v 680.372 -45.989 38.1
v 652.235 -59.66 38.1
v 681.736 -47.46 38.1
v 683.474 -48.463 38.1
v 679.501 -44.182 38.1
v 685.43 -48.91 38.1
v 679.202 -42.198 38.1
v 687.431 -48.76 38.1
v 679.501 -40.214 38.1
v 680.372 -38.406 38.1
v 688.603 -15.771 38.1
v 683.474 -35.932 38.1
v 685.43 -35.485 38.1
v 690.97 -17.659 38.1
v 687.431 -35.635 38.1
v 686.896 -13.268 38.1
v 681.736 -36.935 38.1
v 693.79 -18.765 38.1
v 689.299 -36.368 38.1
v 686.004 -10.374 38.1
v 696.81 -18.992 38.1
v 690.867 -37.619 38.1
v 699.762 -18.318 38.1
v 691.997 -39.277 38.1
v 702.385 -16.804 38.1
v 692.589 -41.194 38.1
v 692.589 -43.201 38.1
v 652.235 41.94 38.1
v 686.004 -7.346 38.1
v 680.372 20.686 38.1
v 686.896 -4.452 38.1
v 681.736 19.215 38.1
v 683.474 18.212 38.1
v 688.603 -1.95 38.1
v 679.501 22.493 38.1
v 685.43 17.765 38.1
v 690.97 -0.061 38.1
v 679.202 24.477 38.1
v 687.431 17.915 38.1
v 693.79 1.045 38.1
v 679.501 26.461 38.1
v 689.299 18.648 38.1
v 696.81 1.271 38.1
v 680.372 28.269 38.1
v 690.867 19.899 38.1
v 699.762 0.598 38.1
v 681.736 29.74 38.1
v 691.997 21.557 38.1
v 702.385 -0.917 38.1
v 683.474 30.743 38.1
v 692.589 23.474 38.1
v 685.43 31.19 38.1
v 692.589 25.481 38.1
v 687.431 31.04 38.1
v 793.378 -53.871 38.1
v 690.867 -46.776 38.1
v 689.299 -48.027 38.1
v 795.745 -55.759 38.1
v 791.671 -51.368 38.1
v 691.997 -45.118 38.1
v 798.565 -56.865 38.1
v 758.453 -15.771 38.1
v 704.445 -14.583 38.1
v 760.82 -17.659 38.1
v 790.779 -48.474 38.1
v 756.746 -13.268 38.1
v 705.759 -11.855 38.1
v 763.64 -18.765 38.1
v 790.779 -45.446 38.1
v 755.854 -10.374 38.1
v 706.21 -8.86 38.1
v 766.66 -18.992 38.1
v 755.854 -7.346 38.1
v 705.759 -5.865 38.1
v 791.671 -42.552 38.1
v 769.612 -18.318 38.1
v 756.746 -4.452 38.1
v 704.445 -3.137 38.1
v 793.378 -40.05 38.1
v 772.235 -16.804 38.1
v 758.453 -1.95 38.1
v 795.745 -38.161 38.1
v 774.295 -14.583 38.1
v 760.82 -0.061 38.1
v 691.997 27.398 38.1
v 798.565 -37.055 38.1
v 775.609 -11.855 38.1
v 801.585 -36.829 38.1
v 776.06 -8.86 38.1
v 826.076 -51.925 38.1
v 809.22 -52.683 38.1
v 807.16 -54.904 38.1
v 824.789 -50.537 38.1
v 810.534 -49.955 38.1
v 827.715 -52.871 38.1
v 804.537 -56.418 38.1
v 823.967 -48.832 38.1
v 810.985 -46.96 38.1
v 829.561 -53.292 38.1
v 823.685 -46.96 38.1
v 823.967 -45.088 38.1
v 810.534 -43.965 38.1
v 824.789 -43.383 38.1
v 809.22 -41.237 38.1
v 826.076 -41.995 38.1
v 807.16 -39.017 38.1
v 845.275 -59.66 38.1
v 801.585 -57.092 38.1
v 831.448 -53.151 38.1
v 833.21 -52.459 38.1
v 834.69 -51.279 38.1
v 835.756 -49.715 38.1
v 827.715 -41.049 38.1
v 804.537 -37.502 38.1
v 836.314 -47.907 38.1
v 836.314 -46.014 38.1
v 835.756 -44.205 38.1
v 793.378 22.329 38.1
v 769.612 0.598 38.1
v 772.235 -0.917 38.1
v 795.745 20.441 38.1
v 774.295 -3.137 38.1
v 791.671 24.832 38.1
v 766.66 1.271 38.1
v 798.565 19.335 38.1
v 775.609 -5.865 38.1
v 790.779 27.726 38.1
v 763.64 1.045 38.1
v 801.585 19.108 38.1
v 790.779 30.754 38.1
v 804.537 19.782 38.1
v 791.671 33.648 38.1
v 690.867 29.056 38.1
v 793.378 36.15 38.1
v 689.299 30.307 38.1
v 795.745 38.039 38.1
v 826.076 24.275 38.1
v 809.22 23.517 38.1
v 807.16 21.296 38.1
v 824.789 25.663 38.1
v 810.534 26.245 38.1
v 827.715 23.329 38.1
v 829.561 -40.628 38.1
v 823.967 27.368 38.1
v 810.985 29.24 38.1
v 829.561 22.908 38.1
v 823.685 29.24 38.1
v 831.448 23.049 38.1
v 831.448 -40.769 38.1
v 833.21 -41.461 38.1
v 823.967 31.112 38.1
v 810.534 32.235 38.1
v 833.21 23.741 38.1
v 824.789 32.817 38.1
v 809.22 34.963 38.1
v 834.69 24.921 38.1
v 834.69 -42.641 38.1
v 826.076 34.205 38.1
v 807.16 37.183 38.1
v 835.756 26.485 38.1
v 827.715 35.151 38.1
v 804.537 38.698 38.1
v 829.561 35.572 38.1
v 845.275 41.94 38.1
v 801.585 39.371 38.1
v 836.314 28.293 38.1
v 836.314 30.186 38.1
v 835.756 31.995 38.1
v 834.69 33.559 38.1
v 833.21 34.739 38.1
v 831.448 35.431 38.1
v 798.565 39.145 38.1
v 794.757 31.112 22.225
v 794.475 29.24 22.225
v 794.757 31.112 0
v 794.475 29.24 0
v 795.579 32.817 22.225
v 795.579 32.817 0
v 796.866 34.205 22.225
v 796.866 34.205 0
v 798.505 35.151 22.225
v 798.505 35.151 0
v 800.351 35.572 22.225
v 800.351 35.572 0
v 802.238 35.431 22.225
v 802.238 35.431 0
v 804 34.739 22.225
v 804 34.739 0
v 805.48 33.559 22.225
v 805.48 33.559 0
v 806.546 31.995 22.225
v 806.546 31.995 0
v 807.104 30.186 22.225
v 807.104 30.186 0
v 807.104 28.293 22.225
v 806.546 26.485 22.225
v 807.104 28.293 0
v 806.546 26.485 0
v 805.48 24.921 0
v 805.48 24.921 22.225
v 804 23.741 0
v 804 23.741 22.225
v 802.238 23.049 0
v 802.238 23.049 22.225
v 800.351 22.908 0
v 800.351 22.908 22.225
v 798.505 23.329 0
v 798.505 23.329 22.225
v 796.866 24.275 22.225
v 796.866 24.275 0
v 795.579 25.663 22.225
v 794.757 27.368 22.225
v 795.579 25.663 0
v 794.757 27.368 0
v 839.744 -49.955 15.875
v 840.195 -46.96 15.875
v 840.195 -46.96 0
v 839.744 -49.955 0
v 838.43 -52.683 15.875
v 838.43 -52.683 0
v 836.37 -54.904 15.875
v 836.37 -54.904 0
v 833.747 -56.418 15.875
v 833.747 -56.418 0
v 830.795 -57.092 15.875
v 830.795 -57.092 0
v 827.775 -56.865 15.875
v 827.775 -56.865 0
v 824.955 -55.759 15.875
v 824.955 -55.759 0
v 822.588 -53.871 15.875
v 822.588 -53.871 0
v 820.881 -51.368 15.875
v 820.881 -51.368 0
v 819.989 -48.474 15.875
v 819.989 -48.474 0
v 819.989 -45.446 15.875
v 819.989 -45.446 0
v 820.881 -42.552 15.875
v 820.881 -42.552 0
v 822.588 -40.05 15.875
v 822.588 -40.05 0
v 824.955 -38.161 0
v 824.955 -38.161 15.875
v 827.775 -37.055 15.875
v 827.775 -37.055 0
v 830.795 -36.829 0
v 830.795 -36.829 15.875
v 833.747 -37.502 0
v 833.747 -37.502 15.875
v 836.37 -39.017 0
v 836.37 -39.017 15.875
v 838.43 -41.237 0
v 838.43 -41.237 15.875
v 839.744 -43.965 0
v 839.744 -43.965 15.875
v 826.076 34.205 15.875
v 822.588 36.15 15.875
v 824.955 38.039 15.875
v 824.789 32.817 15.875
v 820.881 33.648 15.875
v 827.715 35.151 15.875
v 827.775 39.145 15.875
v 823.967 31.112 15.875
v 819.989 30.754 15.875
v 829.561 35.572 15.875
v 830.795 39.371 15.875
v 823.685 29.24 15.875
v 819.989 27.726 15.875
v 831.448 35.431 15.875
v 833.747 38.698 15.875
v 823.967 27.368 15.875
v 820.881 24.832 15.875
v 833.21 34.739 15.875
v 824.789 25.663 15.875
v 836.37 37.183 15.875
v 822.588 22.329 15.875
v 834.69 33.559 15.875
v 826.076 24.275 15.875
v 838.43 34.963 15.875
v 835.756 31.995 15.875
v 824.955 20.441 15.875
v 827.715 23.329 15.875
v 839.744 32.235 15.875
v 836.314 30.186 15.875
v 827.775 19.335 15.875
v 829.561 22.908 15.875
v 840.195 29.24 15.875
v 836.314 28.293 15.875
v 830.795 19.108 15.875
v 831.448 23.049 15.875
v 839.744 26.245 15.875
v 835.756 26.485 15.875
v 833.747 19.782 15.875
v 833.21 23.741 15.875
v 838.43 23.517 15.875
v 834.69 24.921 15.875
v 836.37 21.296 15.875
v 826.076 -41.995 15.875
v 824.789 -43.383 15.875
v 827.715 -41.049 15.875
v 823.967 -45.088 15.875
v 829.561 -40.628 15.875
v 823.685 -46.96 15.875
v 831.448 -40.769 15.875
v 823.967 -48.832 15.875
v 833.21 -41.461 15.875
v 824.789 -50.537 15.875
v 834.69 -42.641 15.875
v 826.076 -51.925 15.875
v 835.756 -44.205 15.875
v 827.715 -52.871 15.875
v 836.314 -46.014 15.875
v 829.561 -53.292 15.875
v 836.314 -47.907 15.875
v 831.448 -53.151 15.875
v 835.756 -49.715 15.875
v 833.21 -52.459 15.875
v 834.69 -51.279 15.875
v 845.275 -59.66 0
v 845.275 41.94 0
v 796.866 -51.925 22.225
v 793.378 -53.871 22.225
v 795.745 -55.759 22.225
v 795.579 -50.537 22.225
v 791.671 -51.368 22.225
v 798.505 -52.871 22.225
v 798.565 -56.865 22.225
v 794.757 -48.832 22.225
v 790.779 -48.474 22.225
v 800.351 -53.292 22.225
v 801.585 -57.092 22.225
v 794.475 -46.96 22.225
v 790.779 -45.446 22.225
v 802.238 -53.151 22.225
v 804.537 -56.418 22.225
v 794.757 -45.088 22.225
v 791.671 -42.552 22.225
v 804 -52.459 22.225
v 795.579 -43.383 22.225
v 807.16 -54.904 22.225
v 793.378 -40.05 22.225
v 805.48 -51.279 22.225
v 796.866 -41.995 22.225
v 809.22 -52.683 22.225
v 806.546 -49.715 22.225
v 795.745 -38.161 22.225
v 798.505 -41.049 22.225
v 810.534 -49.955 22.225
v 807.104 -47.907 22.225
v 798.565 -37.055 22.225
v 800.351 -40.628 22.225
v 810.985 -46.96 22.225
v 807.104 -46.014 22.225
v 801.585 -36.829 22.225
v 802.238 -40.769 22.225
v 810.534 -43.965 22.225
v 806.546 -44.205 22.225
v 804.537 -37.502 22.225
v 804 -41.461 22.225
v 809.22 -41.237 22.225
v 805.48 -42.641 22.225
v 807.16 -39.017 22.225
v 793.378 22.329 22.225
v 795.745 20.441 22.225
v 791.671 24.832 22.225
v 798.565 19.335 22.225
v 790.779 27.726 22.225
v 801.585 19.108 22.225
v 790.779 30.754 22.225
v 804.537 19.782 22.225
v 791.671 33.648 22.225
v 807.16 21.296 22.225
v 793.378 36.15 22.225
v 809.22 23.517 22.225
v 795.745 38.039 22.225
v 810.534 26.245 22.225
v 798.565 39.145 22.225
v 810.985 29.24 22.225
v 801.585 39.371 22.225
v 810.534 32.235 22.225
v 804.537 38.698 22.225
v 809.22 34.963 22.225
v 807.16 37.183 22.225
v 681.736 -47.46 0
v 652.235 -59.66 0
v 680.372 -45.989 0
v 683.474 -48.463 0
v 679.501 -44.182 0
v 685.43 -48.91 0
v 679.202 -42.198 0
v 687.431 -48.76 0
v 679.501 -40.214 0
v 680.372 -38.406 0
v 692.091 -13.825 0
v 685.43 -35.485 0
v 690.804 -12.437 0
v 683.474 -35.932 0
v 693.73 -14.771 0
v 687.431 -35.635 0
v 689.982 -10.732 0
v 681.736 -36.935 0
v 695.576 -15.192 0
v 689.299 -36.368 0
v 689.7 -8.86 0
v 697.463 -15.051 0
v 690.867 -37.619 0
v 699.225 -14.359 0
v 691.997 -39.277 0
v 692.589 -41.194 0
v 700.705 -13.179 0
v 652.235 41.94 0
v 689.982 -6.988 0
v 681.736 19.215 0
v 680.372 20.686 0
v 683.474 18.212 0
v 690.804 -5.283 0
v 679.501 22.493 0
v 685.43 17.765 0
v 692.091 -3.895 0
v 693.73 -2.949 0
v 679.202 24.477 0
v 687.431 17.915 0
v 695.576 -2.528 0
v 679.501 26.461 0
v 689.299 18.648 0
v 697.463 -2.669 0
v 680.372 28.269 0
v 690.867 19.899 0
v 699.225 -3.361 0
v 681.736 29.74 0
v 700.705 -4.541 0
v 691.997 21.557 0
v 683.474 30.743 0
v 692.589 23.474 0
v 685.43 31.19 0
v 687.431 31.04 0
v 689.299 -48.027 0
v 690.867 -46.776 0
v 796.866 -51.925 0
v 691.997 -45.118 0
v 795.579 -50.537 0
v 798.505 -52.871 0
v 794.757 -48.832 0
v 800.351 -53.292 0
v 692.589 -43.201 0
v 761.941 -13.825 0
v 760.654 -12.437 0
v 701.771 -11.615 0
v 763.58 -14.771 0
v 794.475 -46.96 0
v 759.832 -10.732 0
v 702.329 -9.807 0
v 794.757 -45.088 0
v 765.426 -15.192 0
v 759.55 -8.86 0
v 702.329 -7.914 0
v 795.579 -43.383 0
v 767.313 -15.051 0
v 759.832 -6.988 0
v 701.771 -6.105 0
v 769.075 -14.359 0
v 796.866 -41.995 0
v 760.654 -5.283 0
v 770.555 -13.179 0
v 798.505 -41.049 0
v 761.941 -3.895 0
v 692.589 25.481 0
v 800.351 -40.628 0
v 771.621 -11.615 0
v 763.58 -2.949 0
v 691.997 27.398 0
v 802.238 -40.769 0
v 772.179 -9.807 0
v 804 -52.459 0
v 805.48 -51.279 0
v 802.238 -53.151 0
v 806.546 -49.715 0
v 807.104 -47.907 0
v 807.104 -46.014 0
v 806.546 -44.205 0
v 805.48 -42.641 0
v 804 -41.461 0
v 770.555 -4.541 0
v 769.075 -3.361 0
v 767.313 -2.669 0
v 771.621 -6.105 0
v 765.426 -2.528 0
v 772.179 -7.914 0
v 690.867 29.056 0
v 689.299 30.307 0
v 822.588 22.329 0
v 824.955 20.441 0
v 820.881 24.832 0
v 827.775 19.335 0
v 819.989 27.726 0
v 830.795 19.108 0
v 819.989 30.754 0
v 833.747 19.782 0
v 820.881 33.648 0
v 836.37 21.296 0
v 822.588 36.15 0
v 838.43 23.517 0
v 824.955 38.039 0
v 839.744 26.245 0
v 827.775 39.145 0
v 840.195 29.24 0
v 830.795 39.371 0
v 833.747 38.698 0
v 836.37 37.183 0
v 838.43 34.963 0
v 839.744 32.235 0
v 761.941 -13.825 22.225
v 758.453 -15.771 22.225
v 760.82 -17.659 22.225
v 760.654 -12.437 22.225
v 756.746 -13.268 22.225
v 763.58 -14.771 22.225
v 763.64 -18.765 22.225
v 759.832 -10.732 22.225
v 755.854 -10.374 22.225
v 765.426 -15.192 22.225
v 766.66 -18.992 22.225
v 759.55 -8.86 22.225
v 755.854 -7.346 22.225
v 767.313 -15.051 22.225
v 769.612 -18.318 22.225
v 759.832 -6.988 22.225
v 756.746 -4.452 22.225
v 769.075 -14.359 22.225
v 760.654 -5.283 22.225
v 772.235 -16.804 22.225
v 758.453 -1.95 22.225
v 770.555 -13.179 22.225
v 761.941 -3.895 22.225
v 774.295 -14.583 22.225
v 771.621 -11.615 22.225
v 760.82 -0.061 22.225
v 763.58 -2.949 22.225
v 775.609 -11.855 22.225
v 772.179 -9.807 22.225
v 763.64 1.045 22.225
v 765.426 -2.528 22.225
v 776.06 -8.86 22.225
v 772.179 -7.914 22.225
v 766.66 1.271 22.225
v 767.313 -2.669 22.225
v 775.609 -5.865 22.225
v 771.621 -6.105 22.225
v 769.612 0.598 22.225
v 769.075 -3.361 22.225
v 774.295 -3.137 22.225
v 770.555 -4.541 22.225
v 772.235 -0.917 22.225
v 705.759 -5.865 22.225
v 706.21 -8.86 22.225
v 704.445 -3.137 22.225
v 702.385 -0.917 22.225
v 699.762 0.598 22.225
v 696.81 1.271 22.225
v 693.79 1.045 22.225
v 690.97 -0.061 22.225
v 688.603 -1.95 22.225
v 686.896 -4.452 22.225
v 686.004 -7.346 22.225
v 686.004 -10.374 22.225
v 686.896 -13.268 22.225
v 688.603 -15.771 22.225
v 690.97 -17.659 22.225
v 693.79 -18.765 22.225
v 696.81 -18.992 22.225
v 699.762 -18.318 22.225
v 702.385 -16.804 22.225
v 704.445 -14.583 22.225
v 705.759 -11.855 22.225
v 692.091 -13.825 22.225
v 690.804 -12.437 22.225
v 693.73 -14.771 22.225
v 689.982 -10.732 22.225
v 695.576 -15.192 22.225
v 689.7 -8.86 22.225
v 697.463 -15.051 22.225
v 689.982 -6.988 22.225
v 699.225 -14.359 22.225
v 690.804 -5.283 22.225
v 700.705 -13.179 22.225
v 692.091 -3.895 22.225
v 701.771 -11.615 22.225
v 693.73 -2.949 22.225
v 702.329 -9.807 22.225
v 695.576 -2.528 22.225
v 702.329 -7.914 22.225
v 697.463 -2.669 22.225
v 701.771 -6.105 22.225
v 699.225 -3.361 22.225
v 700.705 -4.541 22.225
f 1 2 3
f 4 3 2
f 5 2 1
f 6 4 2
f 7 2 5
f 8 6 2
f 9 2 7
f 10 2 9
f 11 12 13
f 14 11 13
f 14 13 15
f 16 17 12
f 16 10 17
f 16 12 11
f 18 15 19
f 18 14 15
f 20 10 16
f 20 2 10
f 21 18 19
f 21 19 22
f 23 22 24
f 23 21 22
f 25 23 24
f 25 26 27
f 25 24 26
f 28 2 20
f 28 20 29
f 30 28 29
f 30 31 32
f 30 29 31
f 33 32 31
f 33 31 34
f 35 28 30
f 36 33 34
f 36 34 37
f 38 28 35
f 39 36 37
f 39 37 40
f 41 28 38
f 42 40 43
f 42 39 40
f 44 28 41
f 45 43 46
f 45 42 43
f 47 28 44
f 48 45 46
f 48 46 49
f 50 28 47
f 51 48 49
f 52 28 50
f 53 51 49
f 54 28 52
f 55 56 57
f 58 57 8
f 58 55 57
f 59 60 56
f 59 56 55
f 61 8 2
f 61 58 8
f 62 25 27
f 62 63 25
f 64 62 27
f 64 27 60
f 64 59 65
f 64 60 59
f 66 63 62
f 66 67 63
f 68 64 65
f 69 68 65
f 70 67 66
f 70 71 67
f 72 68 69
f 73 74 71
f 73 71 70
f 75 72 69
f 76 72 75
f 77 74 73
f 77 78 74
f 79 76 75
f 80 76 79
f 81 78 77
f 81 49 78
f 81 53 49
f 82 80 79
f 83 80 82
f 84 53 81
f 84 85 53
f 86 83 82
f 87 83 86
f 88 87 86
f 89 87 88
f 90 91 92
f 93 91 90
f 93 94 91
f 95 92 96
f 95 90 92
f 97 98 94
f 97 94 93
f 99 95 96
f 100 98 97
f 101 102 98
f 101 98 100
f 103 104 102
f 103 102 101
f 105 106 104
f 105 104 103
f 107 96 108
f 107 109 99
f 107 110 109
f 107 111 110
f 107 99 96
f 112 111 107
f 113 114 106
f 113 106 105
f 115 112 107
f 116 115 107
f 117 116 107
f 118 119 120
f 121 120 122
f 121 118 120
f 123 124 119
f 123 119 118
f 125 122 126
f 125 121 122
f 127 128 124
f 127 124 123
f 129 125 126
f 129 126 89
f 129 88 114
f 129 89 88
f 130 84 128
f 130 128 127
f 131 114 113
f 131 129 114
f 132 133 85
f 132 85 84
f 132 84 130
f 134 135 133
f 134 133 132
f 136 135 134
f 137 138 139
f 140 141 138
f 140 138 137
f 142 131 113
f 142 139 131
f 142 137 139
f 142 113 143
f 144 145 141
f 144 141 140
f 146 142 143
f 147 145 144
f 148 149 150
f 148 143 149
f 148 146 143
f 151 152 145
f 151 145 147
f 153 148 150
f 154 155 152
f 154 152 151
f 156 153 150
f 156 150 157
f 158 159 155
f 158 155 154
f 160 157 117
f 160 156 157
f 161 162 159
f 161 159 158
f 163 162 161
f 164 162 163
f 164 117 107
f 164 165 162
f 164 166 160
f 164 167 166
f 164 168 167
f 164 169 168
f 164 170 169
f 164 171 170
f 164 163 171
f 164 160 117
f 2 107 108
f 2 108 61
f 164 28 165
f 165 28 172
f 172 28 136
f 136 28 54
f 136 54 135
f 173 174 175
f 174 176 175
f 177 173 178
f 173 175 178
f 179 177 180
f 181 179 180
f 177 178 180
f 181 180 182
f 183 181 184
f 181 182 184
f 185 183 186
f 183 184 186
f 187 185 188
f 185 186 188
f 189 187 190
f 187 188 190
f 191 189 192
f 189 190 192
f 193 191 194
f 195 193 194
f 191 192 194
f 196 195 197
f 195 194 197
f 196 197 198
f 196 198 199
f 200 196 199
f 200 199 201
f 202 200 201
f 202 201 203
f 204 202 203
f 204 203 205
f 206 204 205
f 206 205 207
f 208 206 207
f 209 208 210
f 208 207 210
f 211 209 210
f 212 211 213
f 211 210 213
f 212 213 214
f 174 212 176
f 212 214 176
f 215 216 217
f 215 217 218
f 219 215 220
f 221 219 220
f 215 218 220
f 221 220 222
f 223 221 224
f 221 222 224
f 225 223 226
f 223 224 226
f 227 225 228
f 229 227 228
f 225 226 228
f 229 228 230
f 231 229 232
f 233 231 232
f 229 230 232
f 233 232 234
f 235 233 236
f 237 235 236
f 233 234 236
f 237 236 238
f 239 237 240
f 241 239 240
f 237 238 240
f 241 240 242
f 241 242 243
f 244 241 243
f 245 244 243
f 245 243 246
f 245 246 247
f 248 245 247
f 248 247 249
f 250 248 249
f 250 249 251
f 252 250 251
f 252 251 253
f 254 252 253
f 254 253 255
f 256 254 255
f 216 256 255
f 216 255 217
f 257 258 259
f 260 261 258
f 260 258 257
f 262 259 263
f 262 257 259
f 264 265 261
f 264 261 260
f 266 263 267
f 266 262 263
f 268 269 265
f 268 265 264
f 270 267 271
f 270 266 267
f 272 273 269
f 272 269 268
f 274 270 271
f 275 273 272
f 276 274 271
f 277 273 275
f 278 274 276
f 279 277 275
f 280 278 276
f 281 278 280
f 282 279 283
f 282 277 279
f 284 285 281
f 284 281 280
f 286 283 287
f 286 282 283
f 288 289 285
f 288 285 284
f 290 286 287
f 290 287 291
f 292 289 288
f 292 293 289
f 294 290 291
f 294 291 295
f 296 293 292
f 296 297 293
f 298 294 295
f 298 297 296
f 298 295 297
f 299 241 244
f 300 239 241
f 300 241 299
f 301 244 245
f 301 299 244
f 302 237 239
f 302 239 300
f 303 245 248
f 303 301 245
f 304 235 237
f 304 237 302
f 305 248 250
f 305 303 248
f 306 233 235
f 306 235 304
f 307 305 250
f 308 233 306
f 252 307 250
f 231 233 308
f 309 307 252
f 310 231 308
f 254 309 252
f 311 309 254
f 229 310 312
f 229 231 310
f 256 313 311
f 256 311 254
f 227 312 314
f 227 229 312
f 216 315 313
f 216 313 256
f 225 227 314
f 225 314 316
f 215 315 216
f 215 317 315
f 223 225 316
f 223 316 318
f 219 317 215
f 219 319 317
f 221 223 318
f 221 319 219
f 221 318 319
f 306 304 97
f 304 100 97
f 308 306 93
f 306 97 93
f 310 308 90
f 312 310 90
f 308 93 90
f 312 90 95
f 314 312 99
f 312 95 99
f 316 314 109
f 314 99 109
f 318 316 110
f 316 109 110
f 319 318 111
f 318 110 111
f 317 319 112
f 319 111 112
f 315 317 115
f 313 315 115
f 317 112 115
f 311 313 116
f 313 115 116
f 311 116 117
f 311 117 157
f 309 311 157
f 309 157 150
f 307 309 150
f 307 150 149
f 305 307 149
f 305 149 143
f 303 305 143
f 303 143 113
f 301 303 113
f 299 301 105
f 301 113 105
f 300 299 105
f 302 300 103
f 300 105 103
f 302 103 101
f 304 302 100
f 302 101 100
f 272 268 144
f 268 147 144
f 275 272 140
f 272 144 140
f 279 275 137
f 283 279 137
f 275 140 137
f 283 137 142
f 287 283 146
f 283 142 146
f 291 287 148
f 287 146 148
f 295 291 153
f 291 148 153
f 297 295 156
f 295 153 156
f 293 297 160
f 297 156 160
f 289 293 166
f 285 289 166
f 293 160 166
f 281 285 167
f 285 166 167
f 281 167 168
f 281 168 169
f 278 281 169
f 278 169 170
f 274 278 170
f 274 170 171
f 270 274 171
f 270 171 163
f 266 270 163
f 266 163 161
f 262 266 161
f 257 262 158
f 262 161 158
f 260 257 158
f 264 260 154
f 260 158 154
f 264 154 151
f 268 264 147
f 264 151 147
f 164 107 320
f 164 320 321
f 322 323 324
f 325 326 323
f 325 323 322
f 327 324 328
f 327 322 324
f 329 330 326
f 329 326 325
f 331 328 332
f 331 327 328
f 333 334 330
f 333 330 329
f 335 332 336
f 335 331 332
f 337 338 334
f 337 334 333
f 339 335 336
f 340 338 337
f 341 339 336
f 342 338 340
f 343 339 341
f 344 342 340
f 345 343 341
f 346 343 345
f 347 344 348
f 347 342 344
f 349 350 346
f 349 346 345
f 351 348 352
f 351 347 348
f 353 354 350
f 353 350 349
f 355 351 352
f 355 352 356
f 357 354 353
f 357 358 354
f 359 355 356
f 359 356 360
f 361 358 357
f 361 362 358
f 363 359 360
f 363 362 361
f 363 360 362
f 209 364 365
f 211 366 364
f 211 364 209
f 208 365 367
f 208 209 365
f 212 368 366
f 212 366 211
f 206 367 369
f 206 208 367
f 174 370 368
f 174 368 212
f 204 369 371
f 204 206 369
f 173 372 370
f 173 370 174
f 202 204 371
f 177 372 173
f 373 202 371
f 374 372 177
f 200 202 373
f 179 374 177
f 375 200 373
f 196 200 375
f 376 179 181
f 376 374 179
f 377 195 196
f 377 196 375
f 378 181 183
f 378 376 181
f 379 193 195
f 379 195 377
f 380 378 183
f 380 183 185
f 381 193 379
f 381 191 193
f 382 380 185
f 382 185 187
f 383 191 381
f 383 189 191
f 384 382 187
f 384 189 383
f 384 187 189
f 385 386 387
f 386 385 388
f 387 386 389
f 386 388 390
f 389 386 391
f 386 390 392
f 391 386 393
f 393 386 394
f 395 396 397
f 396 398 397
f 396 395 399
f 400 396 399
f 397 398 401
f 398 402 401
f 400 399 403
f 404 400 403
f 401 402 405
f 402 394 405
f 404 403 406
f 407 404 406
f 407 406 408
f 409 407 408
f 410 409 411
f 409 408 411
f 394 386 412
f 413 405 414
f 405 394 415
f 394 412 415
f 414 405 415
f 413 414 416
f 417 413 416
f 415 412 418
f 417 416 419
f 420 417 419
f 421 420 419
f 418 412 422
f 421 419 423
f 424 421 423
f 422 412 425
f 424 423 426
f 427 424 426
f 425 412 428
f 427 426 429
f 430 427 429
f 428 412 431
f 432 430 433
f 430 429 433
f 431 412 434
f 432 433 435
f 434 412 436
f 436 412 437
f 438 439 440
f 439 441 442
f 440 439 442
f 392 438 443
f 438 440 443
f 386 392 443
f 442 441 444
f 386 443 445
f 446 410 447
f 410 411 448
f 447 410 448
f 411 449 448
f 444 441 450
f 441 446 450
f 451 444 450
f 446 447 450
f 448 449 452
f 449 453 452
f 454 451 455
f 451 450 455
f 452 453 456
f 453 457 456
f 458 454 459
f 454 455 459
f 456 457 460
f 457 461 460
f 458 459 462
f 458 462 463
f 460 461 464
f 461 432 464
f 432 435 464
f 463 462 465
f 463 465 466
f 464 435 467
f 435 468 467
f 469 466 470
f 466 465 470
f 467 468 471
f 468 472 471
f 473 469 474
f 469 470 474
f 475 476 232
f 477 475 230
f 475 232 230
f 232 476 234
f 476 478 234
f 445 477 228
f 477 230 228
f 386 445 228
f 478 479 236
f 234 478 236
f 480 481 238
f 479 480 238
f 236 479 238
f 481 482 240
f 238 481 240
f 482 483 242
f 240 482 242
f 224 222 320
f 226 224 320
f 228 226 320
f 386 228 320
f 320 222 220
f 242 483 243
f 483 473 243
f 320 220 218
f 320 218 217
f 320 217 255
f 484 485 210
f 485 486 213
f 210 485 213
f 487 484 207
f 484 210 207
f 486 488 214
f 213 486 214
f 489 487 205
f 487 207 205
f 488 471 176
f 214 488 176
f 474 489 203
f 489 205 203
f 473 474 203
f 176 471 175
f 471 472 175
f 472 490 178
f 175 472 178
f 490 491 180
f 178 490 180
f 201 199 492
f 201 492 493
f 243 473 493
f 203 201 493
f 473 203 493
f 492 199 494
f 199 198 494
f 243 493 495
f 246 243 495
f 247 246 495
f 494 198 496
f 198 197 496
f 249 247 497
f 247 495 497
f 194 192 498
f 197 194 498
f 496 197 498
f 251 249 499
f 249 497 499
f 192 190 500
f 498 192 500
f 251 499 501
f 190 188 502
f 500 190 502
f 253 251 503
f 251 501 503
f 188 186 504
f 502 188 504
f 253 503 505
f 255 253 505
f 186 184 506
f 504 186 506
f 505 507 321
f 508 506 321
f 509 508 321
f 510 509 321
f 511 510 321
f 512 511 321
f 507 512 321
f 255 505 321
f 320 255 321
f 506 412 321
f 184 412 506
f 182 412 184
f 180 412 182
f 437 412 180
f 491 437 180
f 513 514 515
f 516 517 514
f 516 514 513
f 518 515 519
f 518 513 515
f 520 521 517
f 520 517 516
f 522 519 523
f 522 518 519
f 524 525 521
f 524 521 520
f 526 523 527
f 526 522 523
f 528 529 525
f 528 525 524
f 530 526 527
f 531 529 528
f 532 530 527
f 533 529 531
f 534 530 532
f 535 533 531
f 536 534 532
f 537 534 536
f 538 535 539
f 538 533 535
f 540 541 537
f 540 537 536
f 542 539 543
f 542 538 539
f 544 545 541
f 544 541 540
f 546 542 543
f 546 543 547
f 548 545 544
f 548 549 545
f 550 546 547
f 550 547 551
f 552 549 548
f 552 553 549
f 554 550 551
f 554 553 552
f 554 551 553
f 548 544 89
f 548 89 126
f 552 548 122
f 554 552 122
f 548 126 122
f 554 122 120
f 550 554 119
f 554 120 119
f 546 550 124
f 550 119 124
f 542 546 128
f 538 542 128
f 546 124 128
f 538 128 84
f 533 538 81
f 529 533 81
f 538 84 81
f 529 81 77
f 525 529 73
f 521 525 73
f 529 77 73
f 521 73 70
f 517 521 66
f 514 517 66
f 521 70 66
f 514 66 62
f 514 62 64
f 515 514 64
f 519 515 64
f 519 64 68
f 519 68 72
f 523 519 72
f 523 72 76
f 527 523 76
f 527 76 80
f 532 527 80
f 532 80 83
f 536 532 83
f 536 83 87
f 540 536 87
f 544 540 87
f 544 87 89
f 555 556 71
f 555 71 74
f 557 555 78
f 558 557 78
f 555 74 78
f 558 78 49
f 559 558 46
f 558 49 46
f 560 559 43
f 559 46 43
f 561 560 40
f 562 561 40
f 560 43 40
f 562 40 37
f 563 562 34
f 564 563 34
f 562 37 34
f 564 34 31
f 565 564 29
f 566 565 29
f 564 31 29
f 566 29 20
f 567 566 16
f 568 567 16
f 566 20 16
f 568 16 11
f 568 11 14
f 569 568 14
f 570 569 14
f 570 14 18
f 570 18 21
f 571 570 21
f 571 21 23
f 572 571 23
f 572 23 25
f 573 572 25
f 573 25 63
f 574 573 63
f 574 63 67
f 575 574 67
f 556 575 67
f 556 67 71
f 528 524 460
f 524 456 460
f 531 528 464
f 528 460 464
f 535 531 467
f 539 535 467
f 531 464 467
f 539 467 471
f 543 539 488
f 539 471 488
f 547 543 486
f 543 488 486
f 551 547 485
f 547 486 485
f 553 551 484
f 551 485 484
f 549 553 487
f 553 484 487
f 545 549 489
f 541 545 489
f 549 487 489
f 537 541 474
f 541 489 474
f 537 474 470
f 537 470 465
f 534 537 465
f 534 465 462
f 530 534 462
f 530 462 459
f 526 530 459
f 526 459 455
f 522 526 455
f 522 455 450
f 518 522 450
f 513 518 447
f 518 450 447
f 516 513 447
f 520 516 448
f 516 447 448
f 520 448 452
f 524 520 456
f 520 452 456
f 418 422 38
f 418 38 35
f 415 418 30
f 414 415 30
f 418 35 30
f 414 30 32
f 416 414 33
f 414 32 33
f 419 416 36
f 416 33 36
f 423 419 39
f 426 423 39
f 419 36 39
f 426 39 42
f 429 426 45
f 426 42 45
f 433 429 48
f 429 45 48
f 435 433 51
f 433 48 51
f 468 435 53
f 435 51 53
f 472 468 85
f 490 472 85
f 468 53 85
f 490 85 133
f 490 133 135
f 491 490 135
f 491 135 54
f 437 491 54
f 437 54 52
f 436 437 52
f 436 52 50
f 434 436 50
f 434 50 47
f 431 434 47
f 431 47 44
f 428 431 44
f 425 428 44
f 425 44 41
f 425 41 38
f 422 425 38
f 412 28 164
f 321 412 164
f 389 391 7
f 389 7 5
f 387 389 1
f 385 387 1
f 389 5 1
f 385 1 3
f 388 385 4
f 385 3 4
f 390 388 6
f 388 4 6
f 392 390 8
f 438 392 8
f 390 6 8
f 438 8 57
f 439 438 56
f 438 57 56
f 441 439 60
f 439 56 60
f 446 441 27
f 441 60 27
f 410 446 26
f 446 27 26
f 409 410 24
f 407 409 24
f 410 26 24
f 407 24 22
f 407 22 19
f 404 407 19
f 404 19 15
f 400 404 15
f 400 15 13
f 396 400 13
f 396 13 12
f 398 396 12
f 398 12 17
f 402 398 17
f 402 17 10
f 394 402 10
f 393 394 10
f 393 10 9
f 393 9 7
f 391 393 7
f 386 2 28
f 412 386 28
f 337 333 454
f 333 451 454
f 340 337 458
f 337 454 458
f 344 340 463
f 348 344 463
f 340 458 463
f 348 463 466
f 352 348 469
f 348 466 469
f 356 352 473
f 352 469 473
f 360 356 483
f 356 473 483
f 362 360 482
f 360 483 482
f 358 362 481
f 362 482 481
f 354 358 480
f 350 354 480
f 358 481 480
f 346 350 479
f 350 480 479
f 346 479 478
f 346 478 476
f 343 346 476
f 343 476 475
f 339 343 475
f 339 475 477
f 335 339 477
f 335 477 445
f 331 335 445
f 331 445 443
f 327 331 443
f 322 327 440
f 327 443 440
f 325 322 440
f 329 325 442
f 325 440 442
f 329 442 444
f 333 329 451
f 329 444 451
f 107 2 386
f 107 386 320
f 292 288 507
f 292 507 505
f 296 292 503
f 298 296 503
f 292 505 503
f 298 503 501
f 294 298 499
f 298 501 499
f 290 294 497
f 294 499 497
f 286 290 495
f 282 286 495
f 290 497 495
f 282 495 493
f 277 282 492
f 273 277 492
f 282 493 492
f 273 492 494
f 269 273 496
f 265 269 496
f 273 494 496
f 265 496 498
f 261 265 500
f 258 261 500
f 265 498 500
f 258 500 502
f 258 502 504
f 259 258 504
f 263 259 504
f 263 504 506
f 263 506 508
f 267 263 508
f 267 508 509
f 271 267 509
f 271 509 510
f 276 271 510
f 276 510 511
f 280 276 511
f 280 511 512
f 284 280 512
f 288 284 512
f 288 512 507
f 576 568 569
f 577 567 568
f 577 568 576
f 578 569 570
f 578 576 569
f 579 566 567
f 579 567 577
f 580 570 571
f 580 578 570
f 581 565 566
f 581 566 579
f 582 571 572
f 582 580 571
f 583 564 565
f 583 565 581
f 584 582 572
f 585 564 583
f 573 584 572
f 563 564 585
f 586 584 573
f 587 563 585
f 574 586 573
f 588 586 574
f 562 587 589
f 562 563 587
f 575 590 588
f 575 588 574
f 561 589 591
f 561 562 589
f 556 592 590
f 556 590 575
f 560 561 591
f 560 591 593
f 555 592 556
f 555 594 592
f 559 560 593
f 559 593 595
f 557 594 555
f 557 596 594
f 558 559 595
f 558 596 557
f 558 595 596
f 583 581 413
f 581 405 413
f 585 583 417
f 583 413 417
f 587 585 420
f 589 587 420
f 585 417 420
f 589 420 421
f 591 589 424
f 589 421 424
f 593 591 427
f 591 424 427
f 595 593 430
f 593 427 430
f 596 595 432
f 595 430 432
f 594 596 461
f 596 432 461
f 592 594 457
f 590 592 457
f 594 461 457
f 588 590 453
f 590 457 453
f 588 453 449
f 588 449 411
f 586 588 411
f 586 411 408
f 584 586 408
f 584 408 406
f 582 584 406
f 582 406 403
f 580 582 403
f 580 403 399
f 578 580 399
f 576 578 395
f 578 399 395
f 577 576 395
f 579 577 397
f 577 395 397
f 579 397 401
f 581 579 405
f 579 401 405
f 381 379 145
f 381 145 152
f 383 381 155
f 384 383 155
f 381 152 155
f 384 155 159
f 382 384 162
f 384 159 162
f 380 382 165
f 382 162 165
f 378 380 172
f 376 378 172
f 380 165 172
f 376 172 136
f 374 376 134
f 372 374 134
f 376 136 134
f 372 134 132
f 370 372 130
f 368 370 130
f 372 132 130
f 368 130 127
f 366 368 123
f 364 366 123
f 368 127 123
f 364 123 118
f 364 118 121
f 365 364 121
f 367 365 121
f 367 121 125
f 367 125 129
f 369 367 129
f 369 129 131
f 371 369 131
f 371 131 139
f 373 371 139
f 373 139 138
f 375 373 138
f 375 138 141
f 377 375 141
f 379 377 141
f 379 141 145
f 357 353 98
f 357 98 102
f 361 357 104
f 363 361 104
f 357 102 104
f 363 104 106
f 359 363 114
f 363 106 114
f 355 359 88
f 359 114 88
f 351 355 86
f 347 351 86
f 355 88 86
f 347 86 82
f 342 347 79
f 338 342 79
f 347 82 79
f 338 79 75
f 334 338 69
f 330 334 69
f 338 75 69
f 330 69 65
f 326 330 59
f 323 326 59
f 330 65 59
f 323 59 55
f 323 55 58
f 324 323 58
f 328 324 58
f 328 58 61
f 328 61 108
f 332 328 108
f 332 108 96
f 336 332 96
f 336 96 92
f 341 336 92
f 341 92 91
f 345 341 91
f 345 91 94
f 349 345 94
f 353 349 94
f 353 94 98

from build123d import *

# Parameters (mm, degrees)
F0_W           = 193.04
F0_H           = 101.6
F0_R           = 6.731
F0_R_2         = 10.16
F0_R_3         = 6.5278
F0_R_4         = 6.35
F1_DEPTH       = 38.1
F2_D           = 12.7
F2_DEPTH       = 50.8
F2_CBORE_D     = 20.32
F2_CBORE_DEPTH = 15.875
F2_TIP         = 3.8154649308
F4_D           = 13.462
F4_DEPTH       = 50.8
F4_TIP         = 4.0443928267
F5_D           = 12.7
F5_DEPTH       = 50.8
F5_CBORE_D     = 20.32
F5_CBORE_DEPTH = 15.875
F5_TIP         = 3.8154649308


with BuildPart() as f1:
    # F0 (on Top) → F1 (new body)
    with BuildSketch(Plane.XY):
        with Locations((748.7553224, -8.8601296)):
            Rectangle(F0_W, F0_H)
        with Locations((685.9330706, -42.1976296)):
            Circle(F0_R, mode=Mode.SUBTRACT)
        with Locations((696.0503224, -8.8601296)):
            Circle(F0_R_2, mode=Mode.SUBTRACT)
        with Locations((685.9330706, 24.4773704)):
            Circle(F0_R, mode=Mode.SUBTRACT)
        with Locations((800.8253224, -46.9601296)):
            Circle(F0_R_2, mode=Mode.SUBTRACT)
        with Locations((830.0353224, -46.9601296)):
            Circle(F0_R_2, mode=Mode.SUBTRACT)
        with Locations((765.9003224, -8.8601296)):
            Circle(F0_R_2, mode=Mode.SUBTRACT)
        with Locations((800.8253224, 29.2398704)):
            Circle(F0_R_2, mode=Mode.SUBTRACT)
        with Locations((830.0353224, 29.2398704)):
            Circle(F0_R_2, mode=Mode.SUBTRACT)
        with Locations((830.0353224, -46.9601296)):
            Circle(F0_R_2)
        with Locations((830.0353224, -46.9601296)):
            Circle(F0_R_3, mode=Mode.SUBTRACT)
        with Locations((800.8253224, 29.2398704)):
            Circle(F0_R_2)
        with Locations((800.8253224, 29.2398704)):
            Circle(F0_R_4, mode=Mode.SUBTRACT)
        with Locations((830.0353224, 29.2398704)):
            Circle(F0_R_2)
        with Locations((830.0353224, 29.2398704)):
            Circle(F0_R_3, mode=Mode.SUBTRACT)
        with Locations((696.0503224, -8.8601296)):
            Circle(F0_R_2)
        with Locations((696.0503224, -8.8601296)):
            Circle(F0_R_4, mode=Mode.SUBTRACT)
        with Locations((800.8253224, -46.9601296)):
            Circle(F0_R_2)
        with Locations((800.8253224, -46.9601296)):
            Circle(F0_R_4, mode=Mode.SUBTRACT)
        with Locations((765.9003224, -8.8601296)):
            Circle(F0_R_2)
        with Locations((765.9003224, -8.8601296)):
            Circle(F0_R_4, mode=Mode.SUBTRACT)
        with Locations((685.9330706, 24.4773704)):
            Circle(F0_R)
        with Locations((685.9330706, -42.1976296)):
            Circle(F0_R)
        with Locations((830.0353224, -46.9601296)):
            Circle(F0_R_3)
        with Locations((830.0353224, 29.2398704)):
            Circle(F0_R_3)
        with Locations((800.8253224, 29.2398704)):
            Circle(F0_R_4)
        with Locations((765.9003224, -8.8601296)):
            Circle(F0_R_4)
        with Locations((696.0503224, -8.8601296)):
            Circle(F0_R_4)
        with Locations((800.8253224, -46.9601296)):
            Circle(F0_R_4)
    extrude(amount=-F1_DEPTH)

    # F2
    with Locations(Plane.XY):
        with Locations((800.8253224, 29.2398704), (800.8253224, -46.9601296), (765.9003224, -8.8601296), (696.0503224, -8.8601296)):
            CounterBoreHole(F2_D / 2, F2_CBORE_D / 2, F2_CBORE_DEPTH, depth=F2_DEPTH)
            with Locations((0, 0, -(F2_DEPTH + F2_TIP / 2))):  # 118° drill point
                Cone(0, F2_D / 2, F2_TIP, mode=Mode.SUBTRACT)


with BuildPart() as f1_1:
    # F3: moved
    add(f1.part.moved(Location((0, 0, 38.1))))

    # F4
    with Locations(Plane(origin=(0, 0, 0), x_dir=(1, 0, 0), z_dir=(0, 0, -1))):
        with Locations((685.9330706, -24.4773704), (685.9330706, 42.1976296)):
            Hole(F4_D / 2, depth=F4_DEPTH)
            with Locations((0, 0, -(F4_DEPTH + F4_TIP / 2))):  # 118° drill point
                Cone(0, F4_D / 2, F4_TIP, mode=Mode.SUBTRACT)

    # F5
    with Locations(Plane(origin=(0, 0, 0), x_dir=(1, 0, 0), z_dir=(0, 0, -1))):
        with Locations((830.0353224, 46.9601296), (830.0353224, -29.2398704)):
            CounterBoreHole(F5_D / 2, F5_CBORE_D / 2, F5_CBORE_DEPTH, depth=F5_DEPTH)
            with Locations((0, 0, -(F5_DEPTH + F5_TIP / 2))):  # 118° drill point
                Cone(0, F5_D / 2, F5_TIP, mode=Mode.SUBTRACT)


solid = f1_1.part
